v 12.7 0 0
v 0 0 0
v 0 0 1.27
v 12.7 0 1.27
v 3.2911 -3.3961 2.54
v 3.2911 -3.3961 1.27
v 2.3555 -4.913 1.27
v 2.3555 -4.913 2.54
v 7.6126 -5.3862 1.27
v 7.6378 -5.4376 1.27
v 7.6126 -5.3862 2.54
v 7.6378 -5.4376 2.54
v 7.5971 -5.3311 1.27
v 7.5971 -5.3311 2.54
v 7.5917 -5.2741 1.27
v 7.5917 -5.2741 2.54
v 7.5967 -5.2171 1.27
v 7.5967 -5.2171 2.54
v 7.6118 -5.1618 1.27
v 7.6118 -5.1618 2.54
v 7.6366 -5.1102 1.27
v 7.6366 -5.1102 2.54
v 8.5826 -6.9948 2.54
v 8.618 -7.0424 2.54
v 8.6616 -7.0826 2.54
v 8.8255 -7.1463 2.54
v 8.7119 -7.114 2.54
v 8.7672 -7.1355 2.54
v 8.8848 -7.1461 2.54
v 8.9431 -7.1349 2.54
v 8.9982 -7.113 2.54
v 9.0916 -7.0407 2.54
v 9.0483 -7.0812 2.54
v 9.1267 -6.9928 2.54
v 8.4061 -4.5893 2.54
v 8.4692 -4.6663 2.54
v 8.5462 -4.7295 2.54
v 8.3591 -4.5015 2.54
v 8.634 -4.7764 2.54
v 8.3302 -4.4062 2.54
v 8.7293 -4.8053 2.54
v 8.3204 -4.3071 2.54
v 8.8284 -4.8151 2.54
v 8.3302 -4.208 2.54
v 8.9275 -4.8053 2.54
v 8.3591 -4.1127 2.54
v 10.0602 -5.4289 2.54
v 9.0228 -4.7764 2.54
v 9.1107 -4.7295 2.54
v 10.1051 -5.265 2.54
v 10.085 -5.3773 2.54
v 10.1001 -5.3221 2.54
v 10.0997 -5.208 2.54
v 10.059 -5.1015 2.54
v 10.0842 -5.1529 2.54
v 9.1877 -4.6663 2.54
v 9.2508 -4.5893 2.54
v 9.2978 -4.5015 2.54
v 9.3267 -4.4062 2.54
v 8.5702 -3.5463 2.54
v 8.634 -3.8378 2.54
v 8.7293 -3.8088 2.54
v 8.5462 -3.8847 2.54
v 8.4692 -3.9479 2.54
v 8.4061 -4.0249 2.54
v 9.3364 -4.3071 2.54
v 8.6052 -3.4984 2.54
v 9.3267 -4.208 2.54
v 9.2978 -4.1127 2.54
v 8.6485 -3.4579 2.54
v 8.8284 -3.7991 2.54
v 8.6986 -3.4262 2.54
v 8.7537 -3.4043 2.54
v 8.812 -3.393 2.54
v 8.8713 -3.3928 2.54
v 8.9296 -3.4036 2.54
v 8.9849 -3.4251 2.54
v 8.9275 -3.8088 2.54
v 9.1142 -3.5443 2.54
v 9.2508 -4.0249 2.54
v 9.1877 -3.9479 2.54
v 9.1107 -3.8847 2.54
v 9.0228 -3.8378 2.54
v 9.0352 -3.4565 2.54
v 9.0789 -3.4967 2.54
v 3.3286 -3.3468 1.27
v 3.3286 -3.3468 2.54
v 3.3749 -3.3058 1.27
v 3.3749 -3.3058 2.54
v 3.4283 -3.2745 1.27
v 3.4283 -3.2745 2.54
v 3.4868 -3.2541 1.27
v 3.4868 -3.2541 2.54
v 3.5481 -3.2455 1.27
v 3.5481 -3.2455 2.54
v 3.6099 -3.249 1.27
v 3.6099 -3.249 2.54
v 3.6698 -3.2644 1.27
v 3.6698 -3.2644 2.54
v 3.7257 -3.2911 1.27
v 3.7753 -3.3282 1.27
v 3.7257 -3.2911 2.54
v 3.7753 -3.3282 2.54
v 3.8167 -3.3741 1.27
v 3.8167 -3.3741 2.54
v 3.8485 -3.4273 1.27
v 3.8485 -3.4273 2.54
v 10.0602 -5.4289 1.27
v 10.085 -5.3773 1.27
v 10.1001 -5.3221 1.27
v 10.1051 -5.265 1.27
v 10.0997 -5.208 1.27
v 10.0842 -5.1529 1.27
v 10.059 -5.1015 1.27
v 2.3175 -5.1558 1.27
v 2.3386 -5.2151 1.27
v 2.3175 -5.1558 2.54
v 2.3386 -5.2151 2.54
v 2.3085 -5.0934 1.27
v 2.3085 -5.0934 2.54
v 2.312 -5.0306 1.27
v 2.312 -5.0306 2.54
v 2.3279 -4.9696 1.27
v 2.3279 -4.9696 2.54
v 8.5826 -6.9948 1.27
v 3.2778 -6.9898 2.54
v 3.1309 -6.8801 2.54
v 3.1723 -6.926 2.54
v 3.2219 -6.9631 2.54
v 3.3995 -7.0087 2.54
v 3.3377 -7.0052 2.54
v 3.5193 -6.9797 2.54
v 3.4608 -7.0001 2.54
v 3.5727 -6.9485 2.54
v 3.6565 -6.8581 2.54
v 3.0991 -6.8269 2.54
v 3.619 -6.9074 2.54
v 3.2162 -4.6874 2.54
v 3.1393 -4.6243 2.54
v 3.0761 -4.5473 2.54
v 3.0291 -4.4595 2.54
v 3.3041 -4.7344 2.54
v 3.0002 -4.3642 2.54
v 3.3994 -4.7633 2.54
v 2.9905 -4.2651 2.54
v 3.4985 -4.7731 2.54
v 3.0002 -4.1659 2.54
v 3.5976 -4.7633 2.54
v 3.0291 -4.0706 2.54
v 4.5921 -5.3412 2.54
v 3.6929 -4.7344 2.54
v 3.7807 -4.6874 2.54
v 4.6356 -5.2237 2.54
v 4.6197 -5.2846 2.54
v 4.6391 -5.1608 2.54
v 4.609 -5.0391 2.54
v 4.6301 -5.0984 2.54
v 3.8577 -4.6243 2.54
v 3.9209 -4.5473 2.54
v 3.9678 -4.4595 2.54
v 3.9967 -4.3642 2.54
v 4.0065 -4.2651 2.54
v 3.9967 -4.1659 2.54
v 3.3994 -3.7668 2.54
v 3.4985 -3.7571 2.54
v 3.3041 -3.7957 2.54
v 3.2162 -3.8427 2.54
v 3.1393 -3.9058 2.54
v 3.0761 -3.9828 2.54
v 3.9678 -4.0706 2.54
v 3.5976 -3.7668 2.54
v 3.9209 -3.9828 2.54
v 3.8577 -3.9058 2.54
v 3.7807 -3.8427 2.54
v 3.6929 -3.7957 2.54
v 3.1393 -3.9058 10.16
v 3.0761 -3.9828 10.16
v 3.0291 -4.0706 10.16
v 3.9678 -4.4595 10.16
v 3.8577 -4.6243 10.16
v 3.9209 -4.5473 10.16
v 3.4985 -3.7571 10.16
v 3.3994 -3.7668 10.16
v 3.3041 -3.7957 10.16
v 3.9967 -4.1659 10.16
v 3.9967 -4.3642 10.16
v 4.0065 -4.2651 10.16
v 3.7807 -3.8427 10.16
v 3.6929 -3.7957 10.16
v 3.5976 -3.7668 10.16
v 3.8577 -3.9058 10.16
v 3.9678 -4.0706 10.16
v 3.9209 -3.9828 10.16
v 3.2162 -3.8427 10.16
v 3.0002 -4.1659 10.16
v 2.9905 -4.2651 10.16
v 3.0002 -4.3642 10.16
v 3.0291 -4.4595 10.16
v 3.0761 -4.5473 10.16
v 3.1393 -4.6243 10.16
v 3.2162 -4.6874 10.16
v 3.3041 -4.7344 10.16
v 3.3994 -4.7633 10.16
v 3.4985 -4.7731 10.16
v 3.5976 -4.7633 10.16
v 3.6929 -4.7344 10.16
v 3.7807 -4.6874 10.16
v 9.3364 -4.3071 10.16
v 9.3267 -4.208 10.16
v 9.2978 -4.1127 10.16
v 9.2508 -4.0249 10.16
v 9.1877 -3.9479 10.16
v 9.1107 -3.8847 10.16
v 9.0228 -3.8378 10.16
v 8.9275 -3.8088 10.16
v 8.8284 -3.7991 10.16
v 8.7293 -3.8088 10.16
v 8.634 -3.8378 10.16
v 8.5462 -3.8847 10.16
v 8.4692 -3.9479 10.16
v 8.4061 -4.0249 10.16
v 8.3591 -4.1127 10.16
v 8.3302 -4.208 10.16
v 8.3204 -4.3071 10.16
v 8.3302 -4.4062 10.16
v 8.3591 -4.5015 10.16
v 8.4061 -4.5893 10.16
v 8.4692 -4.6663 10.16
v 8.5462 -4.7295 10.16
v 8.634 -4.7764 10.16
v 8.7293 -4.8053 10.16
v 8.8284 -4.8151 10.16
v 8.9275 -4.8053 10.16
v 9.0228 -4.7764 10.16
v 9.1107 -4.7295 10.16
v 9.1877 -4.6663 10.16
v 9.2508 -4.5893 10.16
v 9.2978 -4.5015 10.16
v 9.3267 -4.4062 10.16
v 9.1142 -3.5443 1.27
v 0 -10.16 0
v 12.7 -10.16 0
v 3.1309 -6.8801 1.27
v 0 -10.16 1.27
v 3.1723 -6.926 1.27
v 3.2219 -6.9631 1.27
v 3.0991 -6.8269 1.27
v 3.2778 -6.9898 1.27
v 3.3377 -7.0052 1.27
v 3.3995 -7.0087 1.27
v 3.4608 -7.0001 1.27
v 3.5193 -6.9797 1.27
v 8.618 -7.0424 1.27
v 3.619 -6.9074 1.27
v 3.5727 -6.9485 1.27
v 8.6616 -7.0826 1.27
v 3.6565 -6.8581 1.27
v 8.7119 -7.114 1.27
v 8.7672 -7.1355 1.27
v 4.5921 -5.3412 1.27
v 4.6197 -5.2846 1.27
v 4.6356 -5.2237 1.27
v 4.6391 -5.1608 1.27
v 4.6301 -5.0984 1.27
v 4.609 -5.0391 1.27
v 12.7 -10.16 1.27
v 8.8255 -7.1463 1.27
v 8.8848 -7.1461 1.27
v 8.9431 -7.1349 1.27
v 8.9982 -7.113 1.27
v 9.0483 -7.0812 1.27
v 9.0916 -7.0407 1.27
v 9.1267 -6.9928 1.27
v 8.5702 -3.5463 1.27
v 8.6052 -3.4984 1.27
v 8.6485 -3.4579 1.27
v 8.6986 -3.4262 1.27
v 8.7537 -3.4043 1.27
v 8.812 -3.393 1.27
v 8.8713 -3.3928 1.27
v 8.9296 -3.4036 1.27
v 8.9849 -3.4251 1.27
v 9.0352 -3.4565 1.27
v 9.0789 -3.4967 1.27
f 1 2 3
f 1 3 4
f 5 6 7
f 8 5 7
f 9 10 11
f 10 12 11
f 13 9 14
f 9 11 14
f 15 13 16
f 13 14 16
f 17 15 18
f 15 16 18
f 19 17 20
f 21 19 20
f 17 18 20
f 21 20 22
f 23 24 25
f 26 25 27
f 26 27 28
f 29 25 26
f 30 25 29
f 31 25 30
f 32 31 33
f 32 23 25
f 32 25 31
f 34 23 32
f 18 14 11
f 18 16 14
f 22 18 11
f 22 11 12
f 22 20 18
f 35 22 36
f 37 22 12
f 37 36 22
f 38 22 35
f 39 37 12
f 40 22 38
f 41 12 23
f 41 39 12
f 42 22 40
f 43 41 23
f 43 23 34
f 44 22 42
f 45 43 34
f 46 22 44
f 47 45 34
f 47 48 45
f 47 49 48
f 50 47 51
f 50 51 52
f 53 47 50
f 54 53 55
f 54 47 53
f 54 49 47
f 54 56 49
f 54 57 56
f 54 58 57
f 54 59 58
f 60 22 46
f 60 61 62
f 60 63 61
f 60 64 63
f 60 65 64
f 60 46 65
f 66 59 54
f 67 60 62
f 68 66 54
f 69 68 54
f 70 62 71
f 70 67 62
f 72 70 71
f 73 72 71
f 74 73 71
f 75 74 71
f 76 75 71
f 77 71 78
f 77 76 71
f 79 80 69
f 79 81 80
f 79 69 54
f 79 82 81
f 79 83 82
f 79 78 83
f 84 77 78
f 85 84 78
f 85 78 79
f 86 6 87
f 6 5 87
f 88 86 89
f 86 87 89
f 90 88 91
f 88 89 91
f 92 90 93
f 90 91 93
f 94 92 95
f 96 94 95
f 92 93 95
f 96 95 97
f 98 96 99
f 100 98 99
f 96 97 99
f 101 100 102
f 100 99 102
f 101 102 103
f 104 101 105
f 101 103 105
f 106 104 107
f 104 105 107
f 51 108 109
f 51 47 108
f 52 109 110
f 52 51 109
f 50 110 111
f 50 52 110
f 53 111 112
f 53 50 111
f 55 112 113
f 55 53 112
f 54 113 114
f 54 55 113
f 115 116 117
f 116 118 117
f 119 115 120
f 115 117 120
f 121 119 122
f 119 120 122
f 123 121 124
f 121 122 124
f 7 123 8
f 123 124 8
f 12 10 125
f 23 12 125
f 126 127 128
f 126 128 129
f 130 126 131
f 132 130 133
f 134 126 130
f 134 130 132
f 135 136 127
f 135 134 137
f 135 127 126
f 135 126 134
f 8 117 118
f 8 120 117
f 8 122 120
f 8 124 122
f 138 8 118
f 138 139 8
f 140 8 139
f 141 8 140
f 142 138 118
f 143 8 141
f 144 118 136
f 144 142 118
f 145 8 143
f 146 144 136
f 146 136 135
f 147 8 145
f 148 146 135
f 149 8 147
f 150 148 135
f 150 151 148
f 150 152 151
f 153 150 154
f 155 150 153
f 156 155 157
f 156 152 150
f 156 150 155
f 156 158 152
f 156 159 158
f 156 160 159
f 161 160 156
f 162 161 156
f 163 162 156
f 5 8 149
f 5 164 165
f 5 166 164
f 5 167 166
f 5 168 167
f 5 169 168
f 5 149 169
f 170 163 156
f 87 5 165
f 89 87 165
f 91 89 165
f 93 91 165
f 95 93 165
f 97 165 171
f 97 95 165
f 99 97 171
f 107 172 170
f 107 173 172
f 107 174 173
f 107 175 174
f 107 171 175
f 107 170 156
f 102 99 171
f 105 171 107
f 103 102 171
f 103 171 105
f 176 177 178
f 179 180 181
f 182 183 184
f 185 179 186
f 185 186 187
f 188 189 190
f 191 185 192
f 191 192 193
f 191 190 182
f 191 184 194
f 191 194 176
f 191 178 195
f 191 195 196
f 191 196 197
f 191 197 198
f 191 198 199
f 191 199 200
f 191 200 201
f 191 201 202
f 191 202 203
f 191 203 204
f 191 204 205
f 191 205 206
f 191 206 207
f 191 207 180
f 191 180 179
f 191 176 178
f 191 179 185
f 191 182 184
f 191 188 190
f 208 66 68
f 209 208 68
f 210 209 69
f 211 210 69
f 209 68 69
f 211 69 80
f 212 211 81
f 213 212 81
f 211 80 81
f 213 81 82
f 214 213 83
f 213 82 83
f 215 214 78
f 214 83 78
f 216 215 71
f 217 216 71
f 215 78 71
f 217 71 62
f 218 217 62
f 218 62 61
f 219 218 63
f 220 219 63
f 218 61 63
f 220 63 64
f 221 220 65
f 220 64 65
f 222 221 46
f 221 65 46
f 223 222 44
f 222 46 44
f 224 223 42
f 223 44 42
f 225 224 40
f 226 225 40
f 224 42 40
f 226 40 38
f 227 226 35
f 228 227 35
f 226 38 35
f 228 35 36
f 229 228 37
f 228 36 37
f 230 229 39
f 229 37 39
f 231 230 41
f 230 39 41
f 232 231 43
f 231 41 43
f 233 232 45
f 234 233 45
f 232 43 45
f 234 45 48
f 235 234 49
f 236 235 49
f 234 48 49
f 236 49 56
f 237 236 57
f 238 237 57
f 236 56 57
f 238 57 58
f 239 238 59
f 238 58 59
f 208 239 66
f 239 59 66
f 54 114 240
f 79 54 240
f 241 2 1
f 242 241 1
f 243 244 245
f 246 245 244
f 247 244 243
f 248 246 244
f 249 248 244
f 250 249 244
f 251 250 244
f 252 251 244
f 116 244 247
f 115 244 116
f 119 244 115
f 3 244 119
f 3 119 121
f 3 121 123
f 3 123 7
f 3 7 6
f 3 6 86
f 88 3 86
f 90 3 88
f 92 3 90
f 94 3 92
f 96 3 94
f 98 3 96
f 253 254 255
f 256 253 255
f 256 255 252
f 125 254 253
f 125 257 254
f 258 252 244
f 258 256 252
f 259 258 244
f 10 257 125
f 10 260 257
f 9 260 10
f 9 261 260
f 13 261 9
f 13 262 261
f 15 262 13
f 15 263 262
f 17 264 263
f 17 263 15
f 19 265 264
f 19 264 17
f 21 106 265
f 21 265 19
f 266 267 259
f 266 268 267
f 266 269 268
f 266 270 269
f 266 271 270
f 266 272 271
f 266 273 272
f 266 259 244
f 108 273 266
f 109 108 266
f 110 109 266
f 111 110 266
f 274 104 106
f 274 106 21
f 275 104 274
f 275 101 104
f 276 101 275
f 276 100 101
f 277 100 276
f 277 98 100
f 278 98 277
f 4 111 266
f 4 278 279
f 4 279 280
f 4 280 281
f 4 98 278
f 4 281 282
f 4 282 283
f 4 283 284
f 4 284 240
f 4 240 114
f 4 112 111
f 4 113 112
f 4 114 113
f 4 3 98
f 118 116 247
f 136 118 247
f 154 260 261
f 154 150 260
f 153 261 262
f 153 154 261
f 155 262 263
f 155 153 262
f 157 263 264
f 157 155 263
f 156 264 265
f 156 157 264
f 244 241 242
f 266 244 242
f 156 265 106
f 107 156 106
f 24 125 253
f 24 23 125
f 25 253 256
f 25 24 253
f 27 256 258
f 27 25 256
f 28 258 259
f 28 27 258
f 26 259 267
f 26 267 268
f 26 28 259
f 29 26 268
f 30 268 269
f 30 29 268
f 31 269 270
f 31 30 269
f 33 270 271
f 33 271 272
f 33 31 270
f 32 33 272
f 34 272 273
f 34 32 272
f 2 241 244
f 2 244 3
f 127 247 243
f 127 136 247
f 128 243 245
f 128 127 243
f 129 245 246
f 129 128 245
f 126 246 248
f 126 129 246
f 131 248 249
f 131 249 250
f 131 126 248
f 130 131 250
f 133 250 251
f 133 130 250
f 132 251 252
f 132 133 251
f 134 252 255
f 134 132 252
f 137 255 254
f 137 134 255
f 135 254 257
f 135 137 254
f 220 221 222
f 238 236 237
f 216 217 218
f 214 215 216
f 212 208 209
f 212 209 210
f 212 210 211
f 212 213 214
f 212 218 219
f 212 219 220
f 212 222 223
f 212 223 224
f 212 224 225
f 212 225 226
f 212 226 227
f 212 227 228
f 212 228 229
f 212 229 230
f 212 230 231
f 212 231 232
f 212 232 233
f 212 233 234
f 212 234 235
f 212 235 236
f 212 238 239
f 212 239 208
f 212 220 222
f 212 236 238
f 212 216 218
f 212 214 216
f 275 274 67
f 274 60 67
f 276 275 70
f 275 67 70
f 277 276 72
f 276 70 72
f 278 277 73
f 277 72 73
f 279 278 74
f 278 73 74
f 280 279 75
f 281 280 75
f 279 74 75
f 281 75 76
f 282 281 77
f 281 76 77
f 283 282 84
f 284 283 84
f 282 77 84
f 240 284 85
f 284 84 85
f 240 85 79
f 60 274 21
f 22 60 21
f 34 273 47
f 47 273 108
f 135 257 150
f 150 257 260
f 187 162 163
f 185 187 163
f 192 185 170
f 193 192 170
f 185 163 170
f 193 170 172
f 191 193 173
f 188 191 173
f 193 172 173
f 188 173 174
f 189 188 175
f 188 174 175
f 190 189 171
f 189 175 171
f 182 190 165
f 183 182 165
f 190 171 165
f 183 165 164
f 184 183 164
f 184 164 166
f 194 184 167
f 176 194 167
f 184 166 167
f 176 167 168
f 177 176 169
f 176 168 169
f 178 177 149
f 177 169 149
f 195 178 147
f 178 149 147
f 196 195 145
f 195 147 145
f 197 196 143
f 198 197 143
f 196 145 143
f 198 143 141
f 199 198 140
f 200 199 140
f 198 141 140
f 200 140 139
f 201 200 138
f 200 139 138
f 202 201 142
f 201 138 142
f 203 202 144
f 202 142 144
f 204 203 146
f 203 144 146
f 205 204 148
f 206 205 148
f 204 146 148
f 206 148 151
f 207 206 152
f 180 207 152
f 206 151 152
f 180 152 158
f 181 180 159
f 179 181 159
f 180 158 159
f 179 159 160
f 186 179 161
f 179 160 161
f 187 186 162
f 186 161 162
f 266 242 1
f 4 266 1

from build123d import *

# Parameters (mm, degrees)
F0_W     = 12.7
F0_H     = 10.16
F1_DEPTH = 1.27
F3_DEPTH = 1.27
F4_R     = 0.3175
F5_R     = 0.3175
F6_R     = 0.508
F7_DEPTH = 7.62
F8_R     = 0.508
F9_DEPTH = 7.62


with BuildPart() as f1:
    # F0 (on Top) → F1 (new body)
    with BuildSketch(Plane.XY):
        with Locations((6.35, -5.08)):
            Rectangle(F0_W, F0_H)
    extrude(amount=F1_DEPTH)

    # F2 (on face) → F3 (join)
    with BuildSketch(Plane.XY.offset(1.27)):
        Polygon((4.682481, -5.194736), (3.598544, -2.897633), (2.265116, -5.059477), (3.349053, -7.356579), align=None)
        Polygon((7.538687, -5.274285), (8.856249, -7.445835), (10.158128, -5.264846), (8.840566, -3.093297), align=None)
    extrude(amount=F3_DEPTH)

    # F4
    f4_edges = [f1.edges().sort_by_distance(p)[0] for p in [
        (3.349053, -7.356579, 1.905),
        (8.856249, -7.445835, 1.905),
    ]]
    fillet(f4_edges, radius=F4_R)

    # F5
    f5_edges = [f1.edges().sort_by_distance(p)[0] for p in [
        (7.538687, -5.274285, 1.905),
        (2.265116, -5.059477, 1.905),
        (3.598544, -2.897633, 1.905),
        (8.840566, -3.093297, 1.905),
        (10.158128, -5.264846, 1.905),
        (4.682481, -5.194736, 1.905),
    ]]
    fillet(f5_edges, radius=F5_R)

    # F6 (on face) → F7 (join)
    with BuildSketch(Plane.XY.offset(2.54)):
        with Locations((3.498474, -4.265051)):
            Circle(F6_R)
    extrude(amount=F7_DEPTH)

    # F8 (on face) → F9 (join)
    with BuildSketch(Plane.XY.offset(2.54)):
        with Locations((8.828444, -4.307084)):
            Circle(F8_R)
    extrude(amount=F9_DEPTH)


solid = f1.part
